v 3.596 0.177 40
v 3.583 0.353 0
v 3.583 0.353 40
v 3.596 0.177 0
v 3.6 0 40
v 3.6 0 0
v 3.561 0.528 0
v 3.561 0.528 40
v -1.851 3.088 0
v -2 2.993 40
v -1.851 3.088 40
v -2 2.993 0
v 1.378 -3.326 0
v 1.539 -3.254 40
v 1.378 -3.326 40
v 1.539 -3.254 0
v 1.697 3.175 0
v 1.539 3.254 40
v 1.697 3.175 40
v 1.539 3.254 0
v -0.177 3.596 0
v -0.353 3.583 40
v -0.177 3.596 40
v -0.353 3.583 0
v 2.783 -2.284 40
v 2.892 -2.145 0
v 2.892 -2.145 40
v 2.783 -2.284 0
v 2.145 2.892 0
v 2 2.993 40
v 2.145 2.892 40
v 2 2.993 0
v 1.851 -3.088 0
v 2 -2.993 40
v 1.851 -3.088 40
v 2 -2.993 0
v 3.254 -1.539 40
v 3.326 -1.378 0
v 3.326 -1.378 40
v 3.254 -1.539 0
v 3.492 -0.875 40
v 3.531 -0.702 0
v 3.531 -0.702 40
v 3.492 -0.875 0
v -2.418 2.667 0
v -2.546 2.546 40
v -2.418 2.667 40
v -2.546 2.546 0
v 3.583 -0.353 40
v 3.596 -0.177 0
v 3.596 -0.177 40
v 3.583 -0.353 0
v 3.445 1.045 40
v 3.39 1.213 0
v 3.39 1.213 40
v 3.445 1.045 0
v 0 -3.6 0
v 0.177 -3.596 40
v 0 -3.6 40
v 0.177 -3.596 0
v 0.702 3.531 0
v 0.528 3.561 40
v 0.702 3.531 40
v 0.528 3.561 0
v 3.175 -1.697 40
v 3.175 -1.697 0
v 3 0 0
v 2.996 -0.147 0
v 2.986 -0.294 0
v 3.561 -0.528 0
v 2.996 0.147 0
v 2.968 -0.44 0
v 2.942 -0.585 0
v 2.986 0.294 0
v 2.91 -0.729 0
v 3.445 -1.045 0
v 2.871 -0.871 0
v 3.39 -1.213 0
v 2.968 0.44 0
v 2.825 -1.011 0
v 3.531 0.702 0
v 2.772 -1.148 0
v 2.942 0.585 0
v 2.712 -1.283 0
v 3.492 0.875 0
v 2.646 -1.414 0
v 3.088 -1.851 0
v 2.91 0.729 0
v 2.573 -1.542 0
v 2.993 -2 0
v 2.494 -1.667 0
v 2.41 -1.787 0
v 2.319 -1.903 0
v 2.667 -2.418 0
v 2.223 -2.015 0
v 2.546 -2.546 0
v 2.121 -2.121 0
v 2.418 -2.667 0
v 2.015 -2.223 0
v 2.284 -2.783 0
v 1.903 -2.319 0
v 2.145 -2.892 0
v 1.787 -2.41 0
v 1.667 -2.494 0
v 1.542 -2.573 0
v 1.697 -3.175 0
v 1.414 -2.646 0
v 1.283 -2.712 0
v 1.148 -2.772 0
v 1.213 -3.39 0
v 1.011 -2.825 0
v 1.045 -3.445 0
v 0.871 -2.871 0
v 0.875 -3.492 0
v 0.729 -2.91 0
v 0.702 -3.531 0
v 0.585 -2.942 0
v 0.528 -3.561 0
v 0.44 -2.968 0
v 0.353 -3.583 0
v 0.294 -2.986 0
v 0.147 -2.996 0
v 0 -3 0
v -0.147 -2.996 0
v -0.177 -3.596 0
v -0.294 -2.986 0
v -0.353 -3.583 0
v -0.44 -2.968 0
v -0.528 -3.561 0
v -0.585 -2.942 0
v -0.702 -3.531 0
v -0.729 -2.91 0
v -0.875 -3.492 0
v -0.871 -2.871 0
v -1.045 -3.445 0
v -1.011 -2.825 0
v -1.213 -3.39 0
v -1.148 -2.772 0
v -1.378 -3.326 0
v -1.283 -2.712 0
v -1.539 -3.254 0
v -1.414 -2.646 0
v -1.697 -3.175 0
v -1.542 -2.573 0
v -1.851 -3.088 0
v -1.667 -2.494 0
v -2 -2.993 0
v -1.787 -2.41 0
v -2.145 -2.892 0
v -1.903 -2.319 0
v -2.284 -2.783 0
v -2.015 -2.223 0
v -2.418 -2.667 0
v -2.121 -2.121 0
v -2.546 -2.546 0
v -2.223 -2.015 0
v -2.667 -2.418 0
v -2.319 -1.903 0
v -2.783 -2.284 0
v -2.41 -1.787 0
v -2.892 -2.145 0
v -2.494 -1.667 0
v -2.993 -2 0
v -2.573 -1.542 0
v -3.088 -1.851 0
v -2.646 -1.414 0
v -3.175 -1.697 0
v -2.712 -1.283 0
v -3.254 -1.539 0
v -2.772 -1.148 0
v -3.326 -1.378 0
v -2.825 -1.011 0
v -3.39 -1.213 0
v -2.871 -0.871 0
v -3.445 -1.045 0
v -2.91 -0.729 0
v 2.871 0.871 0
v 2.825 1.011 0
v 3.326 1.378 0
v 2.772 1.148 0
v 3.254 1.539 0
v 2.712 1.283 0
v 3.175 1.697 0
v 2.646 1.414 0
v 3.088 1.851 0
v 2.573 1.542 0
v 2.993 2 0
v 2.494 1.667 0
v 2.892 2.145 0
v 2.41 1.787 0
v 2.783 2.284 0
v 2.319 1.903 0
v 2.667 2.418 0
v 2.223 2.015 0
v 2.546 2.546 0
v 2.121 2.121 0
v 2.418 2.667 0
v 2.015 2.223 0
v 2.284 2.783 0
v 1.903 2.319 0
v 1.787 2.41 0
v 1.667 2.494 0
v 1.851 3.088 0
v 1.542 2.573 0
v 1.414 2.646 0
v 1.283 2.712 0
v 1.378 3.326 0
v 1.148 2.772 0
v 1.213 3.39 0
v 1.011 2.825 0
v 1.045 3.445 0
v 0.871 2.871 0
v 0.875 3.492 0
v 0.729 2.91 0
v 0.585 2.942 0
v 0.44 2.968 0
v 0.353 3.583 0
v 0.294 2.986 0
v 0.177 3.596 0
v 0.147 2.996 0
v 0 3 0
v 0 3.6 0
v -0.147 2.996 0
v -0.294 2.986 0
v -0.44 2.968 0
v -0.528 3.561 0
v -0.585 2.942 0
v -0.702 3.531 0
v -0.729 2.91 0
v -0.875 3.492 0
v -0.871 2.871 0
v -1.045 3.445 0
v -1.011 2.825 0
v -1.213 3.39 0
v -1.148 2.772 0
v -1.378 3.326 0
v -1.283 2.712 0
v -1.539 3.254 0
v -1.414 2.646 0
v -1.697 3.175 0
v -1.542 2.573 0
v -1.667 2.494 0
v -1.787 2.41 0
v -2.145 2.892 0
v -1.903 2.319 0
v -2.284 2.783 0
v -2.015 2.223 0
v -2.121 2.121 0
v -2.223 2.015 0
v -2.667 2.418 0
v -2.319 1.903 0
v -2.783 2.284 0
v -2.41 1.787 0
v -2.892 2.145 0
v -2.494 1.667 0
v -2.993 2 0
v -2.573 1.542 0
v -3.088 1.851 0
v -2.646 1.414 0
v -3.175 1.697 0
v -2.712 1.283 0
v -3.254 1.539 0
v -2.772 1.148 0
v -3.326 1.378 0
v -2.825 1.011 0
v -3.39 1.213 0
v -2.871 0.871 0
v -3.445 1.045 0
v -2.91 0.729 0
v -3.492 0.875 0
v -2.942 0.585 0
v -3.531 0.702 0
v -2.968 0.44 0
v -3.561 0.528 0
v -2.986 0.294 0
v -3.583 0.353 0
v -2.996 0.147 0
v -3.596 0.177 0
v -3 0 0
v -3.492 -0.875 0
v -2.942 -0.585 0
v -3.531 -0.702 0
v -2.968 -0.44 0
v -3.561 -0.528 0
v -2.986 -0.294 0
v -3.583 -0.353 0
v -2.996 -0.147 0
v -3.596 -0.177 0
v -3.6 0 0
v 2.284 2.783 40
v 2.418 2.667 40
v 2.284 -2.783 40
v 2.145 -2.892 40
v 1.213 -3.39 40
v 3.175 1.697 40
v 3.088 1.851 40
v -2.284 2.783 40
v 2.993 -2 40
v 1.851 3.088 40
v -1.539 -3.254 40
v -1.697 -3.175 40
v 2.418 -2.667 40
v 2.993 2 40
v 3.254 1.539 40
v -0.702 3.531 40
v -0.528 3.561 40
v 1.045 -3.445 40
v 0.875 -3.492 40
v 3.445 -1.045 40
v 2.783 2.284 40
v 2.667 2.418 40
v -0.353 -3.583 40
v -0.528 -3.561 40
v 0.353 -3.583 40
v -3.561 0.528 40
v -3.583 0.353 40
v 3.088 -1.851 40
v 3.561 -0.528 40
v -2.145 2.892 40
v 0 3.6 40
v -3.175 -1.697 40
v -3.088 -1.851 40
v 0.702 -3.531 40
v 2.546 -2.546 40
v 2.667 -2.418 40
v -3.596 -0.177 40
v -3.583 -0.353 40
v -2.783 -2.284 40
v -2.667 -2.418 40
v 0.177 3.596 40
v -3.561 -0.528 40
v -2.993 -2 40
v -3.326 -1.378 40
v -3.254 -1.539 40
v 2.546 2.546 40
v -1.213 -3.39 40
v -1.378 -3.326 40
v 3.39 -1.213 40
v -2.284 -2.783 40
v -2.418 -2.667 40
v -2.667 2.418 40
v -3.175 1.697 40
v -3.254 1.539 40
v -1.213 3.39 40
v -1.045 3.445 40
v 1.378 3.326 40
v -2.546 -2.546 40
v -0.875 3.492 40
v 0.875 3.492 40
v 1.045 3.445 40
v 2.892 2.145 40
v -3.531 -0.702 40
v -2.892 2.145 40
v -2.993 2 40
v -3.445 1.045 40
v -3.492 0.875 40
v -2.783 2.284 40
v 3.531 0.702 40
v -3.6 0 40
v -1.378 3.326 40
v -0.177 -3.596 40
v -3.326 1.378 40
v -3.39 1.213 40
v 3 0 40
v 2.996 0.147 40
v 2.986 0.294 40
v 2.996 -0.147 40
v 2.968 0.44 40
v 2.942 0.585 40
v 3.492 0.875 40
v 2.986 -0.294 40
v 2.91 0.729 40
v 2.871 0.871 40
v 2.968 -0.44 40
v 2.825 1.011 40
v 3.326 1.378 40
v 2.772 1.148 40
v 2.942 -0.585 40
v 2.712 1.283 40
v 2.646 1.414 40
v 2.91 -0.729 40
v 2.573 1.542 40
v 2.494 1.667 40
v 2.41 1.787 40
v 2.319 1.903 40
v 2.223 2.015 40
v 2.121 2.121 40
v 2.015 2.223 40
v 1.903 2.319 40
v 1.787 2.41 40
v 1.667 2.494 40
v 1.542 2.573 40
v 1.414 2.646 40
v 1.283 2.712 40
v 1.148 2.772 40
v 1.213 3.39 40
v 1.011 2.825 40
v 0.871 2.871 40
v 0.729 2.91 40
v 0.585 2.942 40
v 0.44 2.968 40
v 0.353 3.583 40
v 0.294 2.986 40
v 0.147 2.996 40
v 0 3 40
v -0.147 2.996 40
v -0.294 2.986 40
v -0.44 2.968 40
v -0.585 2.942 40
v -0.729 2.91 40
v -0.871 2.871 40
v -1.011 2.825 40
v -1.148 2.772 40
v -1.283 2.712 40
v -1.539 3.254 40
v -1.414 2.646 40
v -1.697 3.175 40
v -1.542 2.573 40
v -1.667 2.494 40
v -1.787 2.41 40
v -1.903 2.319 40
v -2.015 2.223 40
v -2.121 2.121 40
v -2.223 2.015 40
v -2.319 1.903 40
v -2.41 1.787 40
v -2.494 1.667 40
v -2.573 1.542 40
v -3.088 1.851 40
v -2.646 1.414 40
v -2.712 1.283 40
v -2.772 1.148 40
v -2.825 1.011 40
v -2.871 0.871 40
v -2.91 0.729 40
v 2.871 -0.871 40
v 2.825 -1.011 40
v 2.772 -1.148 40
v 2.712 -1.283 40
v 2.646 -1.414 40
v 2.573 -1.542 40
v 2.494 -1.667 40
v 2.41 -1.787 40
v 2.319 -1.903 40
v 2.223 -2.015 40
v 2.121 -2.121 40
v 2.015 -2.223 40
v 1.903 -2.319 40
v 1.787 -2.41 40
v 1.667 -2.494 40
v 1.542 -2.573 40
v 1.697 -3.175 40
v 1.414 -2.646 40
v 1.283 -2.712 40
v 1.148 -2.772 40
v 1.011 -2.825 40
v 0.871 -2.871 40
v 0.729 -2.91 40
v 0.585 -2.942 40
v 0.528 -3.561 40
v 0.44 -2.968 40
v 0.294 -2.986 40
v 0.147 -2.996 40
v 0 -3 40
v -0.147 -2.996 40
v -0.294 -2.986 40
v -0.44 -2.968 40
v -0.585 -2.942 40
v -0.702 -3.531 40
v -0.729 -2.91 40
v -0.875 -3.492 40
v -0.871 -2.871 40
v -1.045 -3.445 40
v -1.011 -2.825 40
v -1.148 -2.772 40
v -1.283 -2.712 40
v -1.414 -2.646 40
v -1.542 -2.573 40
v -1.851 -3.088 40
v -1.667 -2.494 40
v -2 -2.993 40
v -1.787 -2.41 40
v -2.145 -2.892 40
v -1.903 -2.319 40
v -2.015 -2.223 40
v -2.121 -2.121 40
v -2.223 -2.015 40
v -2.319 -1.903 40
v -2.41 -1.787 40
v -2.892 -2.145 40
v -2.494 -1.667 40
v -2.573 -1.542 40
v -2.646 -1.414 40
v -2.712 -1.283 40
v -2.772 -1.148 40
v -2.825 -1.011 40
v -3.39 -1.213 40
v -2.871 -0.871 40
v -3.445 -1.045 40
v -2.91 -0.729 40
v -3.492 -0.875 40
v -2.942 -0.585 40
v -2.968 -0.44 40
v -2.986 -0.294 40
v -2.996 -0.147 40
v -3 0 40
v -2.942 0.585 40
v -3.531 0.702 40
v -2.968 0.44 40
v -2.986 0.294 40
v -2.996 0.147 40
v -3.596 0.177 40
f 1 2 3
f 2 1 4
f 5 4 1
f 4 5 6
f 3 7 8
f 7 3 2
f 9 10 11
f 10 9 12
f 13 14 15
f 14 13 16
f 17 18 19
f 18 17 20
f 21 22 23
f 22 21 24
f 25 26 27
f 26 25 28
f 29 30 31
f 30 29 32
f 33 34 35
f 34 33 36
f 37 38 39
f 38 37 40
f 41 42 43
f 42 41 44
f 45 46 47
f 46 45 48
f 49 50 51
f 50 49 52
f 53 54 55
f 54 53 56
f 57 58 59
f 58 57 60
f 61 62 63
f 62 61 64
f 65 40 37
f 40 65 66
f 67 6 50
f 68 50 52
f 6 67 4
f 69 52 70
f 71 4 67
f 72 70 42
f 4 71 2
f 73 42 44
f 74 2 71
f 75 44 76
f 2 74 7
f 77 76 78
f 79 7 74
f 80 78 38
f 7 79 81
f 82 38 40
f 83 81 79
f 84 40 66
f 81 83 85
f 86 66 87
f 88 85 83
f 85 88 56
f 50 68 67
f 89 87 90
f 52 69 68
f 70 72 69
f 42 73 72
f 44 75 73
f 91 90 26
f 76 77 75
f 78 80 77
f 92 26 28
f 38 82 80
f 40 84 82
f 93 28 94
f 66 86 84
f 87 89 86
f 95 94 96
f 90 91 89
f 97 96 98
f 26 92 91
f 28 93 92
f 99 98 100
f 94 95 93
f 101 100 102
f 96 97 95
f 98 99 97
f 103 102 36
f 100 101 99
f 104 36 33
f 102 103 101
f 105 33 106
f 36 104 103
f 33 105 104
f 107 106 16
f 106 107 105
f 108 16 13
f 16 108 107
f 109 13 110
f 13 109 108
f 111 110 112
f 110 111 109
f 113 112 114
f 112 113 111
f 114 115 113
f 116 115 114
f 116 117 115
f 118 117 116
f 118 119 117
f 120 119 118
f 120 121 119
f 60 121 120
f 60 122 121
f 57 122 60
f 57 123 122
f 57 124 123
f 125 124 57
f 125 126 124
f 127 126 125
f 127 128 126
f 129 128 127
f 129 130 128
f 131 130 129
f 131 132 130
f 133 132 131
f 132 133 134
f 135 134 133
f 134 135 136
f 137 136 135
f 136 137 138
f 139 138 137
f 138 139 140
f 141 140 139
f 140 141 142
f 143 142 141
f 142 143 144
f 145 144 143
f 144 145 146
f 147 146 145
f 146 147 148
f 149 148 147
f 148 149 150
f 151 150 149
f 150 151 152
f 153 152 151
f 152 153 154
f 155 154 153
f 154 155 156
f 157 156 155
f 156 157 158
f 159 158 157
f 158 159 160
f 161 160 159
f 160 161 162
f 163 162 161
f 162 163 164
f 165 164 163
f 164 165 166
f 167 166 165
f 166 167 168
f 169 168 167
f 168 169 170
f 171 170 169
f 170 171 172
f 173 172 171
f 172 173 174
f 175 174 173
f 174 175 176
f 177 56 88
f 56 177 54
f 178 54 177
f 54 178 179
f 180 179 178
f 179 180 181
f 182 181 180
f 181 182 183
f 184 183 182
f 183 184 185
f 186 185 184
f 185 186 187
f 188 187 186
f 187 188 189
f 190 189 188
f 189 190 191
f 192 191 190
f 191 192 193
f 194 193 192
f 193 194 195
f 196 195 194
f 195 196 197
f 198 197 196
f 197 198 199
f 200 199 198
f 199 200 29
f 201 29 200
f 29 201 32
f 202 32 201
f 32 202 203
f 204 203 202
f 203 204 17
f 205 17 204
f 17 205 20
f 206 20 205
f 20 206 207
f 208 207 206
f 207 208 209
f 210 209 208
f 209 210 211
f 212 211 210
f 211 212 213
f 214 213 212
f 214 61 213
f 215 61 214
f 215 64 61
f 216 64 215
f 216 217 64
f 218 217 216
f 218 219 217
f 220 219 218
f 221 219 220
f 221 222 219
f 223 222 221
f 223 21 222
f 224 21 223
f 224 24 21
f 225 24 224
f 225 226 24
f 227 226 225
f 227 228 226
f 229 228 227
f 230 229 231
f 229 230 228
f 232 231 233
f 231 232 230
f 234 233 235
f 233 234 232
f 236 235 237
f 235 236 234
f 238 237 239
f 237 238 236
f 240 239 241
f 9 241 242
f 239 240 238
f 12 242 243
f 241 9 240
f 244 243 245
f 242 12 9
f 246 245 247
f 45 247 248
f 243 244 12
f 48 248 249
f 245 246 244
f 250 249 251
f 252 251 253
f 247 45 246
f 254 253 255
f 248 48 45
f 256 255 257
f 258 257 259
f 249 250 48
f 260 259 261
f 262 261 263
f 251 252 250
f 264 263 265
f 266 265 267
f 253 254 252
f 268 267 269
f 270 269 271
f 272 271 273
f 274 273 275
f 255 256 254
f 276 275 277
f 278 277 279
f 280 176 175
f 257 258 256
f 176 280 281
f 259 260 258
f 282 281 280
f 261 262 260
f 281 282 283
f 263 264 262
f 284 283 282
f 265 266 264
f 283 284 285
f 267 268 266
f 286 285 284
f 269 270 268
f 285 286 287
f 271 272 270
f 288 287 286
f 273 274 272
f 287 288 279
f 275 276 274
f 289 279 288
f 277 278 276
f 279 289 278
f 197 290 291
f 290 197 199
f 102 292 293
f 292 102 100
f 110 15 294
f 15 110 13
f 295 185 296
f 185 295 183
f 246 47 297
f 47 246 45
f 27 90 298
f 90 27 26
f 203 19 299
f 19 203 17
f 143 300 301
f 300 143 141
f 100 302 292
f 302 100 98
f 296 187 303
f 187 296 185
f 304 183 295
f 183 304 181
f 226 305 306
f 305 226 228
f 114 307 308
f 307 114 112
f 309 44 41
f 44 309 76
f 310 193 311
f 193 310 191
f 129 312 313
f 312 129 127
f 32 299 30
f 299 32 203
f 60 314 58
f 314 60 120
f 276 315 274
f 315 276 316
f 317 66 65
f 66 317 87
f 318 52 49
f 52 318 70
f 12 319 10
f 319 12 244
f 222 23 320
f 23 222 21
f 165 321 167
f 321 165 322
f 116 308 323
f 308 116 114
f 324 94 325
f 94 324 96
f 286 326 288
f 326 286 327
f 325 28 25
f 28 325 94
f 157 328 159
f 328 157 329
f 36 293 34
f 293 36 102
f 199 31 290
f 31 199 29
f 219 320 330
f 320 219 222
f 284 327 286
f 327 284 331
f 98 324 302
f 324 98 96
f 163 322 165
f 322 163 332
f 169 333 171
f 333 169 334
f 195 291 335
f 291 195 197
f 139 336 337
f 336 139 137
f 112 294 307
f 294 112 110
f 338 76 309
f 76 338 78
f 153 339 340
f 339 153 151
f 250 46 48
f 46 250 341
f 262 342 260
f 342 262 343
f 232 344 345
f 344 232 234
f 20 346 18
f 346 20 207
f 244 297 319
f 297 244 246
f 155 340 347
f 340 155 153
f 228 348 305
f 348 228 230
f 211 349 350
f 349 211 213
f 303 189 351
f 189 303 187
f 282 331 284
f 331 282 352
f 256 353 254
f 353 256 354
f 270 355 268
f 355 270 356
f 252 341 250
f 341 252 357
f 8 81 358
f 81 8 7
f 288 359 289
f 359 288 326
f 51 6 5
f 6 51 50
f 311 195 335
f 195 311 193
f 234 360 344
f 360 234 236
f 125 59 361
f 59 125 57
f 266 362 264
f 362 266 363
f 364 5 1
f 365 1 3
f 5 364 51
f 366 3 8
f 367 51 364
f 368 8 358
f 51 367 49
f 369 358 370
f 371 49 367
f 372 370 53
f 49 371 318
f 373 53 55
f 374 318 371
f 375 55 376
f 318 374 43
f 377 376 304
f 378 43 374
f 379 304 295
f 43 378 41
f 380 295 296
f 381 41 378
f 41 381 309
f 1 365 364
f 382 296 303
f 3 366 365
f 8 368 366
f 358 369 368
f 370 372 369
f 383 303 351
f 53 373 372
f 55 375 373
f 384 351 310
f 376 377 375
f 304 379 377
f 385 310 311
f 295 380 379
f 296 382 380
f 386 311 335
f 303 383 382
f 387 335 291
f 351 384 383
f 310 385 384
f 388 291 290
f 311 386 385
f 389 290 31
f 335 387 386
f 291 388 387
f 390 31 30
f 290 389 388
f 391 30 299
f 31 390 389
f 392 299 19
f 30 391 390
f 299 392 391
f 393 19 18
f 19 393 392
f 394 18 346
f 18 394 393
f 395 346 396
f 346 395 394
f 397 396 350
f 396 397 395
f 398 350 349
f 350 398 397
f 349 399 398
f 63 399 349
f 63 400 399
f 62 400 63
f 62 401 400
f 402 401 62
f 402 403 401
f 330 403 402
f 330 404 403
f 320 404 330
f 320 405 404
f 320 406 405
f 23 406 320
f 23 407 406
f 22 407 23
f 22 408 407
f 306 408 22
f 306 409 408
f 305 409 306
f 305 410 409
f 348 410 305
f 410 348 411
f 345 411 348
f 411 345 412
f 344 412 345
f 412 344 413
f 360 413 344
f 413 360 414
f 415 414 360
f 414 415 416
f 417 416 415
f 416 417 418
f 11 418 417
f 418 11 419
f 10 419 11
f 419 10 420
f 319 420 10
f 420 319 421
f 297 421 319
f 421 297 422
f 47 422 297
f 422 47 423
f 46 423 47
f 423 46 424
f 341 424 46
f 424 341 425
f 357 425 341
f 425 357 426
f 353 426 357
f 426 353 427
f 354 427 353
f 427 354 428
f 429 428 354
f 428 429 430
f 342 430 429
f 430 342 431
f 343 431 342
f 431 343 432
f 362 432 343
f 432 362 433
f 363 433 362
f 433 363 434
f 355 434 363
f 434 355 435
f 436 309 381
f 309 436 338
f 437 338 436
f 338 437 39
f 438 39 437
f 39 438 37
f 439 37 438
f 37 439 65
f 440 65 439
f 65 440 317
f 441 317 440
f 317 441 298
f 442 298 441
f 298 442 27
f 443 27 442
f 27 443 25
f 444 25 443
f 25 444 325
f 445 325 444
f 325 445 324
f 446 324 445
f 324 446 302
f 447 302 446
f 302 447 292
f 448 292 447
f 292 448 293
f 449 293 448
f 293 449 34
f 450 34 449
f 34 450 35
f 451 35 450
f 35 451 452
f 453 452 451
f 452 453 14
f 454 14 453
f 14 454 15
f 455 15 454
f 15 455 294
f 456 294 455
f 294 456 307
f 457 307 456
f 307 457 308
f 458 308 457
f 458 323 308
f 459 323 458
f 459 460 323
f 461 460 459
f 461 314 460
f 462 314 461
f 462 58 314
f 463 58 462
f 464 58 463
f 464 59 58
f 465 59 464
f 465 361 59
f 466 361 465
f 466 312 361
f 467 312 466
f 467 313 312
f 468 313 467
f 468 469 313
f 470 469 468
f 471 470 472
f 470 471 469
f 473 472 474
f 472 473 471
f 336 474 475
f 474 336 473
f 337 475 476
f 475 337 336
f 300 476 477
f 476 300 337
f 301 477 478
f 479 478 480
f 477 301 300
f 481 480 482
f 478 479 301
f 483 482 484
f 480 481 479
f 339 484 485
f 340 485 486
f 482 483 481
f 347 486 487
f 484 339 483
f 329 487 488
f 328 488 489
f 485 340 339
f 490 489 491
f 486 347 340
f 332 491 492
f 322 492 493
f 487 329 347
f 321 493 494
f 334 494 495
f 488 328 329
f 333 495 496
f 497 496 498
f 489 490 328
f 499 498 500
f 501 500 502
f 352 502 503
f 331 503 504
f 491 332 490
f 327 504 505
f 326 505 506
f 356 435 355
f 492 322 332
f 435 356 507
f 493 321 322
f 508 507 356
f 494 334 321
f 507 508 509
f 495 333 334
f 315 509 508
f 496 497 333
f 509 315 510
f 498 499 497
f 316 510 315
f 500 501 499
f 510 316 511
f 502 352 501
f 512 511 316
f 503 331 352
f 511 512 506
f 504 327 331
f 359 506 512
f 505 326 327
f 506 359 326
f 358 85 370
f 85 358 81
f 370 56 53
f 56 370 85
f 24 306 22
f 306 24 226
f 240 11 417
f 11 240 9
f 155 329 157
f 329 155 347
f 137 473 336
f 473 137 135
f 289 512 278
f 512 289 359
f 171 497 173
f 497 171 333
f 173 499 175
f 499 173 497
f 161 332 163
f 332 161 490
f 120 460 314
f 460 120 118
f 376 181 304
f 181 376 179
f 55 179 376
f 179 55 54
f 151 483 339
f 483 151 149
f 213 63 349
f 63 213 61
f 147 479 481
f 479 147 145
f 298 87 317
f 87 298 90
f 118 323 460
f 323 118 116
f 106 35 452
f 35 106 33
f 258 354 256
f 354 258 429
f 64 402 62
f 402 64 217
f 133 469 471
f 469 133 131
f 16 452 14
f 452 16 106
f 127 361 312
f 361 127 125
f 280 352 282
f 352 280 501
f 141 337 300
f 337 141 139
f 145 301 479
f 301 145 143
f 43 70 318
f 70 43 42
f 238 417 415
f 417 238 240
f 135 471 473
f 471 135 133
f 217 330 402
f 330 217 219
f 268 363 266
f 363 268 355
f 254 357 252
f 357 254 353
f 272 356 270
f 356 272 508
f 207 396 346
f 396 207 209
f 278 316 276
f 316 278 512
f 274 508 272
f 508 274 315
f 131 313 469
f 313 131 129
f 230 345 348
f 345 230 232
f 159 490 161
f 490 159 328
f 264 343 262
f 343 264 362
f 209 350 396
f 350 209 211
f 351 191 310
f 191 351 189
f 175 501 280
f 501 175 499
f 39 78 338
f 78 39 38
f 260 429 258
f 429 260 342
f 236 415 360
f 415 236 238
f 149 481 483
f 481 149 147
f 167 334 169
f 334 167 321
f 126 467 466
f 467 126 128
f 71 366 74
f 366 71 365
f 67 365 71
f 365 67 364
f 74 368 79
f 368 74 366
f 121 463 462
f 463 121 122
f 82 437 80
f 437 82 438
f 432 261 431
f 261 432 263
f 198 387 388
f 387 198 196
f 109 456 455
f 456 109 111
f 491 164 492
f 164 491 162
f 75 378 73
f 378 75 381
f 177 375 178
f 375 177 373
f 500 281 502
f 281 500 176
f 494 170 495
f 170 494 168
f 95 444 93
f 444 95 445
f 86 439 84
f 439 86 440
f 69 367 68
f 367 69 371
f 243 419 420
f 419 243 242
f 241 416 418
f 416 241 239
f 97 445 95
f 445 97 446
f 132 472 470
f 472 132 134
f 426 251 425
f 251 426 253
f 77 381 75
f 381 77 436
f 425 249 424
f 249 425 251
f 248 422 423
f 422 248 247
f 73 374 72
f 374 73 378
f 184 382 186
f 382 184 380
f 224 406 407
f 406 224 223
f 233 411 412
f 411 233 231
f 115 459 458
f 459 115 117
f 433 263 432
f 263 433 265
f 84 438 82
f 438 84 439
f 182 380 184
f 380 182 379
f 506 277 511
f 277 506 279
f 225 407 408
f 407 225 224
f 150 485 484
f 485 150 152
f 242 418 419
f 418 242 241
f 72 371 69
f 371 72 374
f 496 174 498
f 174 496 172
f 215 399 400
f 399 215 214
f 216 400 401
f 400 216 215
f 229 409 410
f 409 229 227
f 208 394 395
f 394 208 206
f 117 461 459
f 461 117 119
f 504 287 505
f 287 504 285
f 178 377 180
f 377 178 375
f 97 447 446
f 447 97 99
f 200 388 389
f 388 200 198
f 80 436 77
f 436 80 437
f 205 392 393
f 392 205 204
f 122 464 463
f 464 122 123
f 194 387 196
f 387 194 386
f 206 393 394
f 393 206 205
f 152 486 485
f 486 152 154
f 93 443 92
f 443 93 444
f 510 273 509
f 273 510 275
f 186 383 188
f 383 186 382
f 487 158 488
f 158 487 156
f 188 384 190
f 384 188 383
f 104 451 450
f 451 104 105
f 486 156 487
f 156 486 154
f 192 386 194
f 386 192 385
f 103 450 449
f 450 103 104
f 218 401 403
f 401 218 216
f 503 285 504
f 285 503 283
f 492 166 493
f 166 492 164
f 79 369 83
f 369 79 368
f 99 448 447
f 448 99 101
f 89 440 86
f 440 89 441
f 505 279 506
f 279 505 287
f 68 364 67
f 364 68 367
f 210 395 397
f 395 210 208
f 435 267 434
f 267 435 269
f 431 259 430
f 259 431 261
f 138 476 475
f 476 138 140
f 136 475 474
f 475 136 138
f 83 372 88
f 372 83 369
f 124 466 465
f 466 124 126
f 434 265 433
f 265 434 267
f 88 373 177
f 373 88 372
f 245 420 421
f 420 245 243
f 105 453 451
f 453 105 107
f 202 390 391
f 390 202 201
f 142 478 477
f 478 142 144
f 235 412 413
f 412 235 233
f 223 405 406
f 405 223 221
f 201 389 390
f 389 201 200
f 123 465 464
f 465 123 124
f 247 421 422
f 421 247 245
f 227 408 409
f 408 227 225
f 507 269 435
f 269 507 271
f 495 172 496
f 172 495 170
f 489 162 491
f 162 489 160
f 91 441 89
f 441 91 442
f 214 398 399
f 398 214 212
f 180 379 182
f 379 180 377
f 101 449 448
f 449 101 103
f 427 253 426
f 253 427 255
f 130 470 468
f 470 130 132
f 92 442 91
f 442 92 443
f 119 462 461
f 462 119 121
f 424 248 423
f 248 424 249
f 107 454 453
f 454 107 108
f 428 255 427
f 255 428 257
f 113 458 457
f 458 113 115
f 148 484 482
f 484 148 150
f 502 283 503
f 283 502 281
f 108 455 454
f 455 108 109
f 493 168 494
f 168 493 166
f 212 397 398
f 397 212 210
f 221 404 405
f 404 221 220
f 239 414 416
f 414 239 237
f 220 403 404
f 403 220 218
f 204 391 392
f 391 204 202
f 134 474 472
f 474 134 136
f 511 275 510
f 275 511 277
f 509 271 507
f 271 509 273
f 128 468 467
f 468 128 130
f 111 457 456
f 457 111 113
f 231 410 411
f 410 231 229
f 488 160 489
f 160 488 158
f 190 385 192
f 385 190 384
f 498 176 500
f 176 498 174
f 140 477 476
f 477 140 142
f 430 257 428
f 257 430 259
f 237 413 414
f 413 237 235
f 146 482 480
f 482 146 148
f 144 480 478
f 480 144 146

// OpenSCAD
$fn = 128;

// Heatshrink sleeving (tubing)
inner_d = 6;          // mm
wall_thickness = 0.6; // mm
length = 40;          // mm

outer_d = inner_d + 2*wall_thickness;

module heatshrink_sleeve(id, od, h) {
    difference() {
        cylinder(d=od, h=h, center=false);
        translate([0,0,-0.2])
            cylinder(d=id, h=h+0.4, center=false);
    }
}

heatshrink_sleeve(inner_d, outer_d, length);
